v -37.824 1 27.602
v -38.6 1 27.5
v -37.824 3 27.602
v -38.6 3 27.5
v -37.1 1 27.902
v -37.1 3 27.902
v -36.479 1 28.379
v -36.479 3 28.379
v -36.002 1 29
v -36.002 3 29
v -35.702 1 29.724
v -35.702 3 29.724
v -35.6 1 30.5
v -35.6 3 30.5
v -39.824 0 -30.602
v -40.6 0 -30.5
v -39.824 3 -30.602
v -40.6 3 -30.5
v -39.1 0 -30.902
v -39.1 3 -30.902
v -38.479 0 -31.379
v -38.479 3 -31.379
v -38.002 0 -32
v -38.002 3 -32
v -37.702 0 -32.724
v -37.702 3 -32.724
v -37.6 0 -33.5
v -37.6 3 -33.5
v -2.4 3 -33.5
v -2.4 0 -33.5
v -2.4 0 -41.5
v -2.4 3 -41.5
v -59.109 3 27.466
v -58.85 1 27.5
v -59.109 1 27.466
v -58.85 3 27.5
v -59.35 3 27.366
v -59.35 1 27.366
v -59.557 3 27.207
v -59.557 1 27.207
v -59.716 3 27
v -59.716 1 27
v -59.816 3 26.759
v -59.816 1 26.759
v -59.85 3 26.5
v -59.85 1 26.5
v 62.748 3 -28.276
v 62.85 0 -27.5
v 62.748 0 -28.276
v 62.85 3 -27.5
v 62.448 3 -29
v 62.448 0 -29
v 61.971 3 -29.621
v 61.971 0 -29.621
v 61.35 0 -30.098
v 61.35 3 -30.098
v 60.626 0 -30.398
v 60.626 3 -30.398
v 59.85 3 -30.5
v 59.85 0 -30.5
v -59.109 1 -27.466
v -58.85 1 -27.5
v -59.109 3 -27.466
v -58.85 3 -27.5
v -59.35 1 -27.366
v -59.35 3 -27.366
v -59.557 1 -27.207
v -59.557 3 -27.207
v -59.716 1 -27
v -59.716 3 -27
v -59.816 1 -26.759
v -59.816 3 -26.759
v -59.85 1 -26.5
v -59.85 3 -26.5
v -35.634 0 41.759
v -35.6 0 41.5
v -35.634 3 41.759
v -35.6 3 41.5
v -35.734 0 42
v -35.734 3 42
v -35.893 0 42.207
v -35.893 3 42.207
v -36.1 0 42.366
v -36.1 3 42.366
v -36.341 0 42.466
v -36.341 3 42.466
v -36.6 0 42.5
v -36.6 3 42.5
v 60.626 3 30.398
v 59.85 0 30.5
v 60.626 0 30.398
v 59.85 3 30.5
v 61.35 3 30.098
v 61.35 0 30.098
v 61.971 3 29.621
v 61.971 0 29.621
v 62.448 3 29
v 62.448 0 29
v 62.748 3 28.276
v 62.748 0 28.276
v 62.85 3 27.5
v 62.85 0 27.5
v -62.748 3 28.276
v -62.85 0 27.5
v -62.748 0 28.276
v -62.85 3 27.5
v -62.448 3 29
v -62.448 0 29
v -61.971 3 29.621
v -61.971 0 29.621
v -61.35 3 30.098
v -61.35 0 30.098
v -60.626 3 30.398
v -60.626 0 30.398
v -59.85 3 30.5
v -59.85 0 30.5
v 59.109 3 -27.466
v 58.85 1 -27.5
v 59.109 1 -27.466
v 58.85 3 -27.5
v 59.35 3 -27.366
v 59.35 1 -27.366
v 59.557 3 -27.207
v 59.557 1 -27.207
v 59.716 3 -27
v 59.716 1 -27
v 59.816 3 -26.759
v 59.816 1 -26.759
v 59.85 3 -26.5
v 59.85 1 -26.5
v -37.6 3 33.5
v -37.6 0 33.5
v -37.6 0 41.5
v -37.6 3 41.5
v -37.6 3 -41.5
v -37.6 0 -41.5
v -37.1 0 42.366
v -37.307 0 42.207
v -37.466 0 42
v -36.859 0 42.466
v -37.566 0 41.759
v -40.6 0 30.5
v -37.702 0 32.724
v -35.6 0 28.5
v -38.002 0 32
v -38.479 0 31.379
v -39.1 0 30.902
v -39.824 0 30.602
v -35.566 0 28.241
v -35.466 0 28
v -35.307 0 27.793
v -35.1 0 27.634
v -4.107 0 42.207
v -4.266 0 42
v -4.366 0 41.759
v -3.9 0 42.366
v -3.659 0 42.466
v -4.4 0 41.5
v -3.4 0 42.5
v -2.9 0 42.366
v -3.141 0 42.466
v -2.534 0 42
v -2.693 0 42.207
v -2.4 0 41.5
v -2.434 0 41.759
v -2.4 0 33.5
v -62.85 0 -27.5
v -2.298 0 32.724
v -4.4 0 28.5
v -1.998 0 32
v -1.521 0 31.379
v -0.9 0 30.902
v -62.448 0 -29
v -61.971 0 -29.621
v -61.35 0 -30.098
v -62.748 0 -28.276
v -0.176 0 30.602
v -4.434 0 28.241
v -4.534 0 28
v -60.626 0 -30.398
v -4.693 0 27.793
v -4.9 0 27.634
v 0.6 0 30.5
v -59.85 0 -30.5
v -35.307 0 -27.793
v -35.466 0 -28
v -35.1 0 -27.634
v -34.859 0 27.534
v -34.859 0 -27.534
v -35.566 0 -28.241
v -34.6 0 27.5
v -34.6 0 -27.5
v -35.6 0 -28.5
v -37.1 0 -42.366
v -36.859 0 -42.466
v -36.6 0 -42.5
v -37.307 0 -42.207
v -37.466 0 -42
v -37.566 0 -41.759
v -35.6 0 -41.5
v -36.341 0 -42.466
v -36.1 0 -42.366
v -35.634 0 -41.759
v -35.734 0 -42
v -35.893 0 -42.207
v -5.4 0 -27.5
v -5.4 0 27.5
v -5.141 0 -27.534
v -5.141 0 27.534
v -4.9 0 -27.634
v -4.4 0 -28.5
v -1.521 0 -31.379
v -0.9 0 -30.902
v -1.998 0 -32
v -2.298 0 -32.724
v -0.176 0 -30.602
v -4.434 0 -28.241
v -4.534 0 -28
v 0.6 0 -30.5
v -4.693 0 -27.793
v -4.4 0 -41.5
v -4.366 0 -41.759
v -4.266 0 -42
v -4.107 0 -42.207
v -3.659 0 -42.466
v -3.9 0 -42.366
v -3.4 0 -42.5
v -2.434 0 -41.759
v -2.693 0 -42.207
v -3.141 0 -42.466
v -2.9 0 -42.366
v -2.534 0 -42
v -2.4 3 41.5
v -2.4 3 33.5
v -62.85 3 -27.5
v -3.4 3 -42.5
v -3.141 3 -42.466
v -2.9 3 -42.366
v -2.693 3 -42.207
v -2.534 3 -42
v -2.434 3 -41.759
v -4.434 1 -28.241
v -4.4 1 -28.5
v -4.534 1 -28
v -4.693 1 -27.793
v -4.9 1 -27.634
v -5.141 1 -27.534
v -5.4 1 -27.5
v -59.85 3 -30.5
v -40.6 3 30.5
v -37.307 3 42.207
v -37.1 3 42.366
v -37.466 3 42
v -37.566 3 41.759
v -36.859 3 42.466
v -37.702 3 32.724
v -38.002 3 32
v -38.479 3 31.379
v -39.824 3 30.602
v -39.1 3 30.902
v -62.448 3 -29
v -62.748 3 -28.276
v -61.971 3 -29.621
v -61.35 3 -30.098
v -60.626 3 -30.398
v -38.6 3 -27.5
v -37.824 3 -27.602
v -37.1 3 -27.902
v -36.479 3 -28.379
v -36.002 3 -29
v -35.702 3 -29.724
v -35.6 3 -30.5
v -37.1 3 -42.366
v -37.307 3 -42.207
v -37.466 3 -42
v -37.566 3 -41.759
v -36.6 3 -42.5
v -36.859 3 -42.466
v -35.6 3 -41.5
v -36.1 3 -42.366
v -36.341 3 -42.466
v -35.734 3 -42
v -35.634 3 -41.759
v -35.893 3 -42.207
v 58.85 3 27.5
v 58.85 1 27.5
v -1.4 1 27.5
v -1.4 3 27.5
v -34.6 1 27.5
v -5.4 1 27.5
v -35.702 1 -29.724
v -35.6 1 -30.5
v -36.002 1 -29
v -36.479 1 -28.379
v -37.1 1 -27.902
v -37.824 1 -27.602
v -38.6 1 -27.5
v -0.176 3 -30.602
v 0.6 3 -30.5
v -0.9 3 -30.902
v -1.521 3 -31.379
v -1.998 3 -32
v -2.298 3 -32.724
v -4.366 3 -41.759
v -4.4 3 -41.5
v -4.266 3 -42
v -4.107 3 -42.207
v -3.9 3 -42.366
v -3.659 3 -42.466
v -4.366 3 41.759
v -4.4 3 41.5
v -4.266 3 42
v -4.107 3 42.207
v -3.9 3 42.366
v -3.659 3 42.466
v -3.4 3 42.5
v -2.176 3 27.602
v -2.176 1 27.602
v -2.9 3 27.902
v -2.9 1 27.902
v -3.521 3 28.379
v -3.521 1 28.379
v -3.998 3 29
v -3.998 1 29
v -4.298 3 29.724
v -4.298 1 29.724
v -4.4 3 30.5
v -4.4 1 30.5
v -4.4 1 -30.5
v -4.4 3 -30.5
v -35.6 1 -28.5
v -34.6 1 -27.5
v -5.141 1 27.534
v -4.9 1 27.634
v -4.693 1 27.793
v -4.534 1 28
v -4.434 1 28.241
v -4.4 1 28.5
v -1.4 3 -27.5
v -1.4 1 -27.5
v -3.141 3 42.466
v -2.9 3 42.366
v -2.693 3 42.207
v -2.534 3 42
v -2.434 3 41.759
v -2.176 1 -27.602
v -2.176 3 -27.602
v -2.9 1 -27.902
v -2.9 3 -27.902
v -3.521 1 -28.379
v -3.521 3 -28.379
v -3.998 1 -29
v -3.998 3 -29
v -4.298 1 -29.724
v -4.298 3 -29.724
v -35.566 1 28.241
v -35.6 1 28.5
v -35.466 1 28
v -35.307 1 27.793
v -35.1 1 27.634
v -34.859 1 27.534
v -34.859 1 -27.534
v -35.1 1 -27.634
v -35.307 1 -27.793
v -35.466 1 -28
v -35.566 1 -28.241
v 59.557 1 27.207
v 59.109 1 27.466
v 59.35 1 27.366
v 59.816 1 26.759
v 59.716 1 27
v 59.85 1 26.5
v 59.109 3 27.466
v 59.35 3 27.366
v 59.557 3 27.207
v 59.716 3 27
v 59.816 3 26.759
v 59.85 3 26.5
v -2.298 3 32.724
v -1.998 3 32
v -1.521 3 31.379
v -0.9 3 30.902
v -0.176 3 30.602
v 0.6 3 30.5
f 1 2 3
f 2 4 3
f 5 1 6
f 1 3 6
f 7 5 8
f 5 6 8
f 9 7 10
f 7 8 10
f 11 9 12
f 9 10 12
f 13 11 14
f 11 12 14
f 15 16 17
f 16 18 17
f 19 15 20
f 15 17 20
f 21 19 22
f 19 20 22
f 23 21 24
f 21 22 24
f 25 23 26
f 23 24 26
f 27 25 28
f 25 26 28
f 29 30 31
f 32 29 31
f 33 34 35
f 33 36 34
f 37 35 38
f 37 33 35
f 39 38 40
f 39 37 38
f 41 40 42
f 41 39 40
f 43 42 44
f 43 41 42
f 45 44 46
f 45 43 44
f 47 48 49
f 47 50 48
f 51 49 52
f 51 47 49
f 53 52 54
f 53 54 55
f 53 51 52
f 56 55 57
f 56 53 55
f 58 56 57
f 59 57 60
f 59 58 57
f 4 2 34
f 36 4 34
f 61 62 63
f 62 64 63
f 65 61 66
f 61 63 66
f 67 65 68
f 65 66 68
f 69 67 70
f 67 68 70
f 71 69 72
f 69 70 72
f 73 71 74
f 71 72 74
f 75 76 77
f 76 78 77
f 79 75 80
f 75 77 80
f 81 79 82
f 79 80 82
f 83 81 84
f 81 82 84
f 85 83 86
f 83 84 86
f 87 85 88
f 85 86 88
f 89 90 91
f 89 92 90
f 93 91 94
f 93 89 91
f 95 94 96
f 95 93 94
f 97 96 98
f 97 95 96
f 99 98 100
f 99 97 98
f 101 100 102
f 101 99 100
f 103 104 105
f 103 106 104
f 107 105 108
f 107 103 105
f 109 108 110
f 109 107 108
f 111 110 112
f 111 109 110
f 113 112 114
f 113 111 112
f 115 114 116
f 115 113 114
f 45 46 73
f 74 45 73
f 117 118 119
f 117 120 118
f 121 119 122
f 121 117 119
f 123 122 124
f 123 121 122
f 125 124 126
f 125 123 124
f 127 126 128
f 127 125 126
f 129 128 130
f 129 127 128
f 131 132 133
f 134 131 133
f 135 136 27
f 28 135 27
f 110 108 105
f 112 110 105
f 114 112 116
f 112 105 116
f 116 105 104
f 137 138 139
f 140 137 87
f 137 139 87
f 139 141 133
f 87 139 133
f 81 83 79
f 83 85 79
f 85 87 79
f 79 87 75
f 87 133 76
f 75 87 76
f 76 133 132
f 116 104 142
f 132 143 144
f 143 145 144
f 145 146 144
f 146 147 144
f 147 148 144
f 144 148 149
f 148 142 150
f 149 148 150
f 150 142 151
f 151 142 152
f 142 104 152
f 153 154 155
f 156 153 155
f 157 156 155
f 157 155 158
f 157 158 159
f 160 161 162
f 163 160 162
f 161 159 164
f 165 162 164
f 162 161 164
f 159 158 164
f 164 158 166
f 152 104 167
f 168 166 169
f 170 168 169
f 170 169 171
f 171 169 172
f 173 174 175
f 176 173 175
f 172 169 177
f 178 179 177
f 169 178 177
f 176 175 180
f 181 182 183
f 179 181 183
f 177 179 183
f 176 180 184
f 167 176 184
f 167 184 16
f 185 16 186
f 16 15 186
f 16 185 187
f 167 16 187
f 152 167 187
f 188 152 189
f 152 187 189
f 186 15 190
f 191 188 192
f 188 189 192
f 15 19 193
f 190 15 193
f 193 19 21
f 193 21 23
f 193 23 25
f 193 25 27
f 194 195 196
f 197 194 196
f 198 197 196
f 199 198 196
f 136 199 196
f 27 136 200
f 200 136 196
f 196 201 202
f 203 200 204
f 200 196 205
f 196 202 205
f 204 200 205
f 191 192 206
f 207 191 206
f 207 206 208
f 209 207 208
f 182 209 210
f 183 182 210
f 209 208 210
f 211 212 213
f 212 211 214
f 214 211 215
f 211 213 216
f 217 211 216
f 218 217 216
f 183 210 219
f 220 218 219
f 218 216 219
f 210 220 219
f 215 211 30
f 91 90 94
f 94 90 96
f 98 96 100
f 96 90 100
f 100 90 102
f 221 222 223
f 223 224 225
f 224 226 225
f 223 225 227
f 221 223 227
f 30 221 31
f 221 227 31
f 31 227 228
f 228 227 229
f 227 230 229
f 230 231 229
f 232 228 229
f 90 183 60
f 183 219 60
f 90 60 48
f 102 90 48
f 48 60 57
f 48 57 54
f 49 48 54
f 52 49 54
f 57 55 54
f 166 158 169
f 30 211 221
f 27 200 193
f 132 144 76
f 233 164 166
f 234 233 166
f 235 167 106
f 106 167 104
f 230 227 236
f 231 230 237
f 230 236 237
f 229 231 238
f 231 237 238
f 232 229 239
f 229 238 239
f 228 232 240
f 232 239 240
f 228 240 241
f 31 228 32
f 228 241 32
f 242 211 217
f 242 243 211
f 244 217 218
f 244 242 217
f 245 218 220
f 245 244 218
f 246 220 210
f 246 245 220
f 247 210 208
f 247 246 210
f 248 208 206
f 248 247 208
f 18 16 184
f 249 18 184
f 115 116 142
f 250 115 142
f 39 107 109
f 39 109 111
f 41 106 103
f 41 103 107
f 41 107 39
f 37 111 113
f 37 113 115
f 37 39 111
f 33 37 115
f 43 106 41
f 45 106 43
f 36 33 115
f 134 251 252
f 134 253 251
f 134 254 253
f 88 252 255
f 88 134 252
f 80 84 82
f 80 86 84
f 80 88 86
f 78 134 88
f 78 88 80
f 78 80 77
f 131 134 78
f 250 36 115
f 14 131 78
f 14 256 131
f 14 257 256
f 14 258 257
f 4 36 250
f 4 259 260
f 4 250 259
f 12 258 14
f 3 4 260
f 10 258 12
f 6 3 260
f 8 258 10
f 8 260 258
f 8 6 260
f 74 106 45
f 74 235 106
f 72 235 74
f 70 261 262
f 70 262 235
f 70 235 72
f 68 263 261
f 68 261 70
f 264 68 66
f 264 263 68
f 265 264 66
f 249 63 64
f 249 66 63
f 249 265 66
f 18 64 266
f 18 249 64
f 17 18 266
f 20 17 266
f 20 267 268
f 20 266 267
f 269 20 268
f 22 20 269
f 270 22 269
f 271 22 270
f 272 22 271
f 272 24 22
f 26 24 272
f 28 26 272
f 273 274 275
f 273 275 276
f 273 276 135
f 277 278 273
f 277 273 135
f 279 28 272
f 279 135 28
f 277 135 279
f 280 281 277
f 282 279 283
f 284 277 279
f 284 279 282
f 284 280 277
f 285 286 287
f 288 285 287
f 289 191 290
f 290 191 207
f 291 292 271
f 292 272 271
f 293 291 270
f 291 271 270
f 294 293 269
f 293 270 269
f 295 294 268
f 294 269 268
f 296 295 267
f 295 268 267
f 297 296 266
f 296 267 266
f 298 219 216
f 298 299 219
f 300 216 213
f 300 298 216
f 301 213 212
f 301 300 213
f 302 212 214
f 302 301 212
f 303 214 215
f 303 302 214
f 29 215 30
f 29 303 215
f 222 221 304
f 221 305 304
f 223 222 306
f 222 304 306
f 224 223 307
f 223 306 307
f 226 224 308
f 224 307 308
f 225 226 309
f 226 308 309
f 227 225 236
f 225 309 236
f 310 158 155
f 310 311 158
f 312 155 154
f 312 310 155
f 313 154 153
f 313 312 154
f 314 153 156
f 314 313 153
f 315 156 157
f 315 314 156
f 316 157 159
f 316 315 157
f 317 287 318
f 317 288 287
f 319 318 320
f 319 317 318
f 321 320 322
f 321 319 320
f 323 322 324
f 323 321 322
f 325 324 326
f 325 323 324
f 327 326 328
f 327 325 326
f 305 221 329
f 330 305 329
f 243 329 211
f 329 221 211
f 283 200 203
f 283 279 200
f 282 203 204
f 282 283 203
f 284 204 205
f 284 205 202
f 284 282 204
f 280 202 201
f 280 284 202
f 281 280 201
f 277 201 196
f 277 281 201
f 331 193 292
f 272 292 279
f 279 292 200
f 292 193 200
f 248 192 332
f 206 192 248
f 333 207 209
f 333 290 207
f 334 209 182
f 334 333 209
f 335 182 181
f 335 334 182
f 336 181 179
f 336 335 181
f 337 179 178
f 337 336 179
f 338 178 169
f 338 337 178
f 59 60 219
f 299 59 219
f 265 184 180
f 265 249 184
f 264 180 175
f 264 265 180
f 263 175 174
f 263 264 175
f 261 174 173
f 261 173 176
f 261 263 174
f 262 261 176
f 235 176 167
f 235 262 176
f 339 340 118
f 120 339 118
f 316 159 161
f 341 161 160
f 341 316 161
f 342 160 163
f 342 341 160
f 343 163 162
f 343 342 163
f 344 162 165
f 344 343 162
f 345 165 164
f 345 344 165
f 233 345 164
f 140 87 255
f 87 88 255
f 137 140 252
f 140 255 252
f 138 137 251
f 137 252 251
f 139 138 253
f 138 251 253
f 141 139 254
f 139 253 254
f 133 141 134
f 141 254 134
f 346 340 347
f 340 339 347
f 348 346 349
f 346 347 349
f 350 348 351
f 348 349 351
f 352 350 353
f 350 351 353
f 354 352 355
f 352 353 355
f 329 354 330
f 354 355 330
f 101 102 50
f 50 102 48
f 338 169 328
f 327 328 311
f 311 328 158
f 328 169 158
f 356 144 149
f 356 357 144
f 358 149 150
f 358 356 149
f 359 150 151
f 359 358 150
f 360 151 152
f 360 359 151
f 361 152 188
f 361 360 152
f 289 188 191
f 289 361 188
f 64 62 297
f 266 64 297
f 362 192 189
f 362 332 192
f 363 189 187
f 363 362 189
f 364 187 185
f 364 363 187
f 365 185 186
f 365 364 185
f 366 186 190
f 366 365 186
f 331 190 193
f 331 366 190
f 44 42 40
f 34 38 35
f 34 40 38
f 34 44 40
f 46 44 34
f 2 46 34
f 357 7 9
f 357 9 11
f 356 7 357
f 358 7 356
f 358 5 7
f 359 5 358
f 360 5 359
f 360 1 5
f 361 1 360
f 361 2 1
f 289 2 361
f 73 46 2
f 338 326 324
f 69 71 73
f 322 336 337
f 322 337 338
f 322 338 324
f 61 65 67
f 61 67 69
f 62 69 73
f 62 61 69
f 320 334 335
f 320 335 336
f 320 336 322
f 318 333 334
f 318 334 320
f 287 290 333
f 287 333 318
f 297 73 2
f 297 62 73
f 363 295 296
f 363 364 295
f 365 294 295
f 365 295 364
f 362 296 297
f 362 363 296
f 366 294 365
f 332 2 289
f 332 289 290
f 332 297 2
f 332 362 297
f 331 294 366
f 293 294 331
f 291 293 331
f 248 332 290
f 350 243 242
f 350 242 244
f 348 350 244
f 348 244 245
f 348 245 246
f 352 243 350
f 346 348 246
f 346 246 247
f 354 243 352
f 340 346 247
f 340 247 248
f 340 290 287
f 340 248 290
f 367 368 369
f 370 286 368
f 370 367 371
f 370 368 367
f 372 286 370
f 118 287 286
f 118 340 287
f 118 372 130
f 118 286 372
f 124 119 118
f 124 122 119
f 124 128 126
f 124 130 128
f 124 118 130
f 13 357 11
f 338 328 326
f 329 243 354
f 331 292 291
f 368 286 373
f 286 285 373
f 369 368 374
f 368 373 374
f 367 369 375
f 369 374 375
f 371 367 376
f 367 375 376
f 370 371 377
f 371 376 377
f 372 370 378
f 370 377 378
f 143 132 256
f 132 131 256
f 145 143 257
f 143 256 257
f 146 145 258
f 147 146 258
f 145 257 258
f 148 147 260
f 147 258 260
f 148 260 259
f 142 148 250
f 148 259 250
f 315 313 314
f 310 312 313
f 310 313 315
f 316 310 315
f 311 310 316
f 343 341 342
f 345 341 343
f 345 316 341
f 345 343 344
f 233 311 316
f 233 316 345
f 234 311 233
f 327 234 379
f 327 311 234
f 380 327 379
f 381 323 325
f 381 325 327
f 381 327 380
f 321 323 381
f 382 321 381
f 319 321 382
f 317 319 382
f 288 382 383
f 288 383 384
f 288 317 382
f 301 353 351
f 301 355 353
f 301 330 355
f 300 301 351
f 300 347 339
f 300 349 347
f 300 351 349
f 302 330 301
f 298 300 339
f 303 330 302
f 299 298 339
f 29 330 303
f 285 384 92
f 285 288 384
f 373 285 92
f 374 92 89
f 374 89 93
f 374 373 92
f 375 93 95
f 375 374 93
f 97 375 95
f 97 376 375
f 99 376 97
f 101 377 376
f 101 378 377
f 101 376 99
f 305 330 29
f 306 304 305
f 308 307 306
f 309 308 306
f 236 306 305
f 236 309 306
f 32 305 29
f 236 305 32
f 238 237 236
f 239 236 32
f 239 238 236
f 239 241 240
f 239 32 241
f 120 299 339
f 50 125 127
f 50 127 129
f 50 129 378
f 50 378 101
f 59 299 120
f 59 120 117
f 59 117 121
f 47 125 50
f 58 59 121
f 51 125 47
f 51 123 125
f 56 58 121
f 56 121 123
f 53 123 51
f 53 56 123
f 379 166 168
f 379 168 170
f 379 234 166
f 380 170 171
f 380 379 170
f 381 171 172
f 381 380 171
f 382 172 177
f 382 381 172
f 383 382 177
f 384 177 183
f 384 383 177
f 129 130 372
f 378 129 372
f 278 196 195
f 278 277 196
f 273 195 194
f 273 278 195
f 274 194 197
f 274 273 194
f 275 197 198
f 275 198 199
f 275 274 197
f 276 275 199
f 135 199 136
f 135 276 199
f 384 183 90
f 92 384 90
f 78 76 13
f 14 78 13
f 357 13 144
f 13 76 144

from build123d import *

# Parameters (mm, degrees)
BOSS_EXTRUDE6_DEPTH   = 3
BOSS_EXTRUDE6_2_DEPTH = 3
SKETCH4_W             = 119.7
SKETCH4_H             = 55
BOSS_EXTRUDE7_DEPTH   = 1
FILLET13_R            = 3
FILLET14_R            = 1
FILLET15_R            = 1
FILLET16_R            = 3
FILLET17_R            = 3
FILLET18_R            = 1
FILLET19_R            = 3
FILLET20_R            = 1


with BuildPart() as part:
    # Sketch3 → Boss-Extrude6 (new body)
    with BuildSketch(Plane(origin=(0, 0, 0), x_dir=(1, 0, 0), z_dir=(0, 1, 0))):
        Polygon((-35.6, -27.5), (-59.85, -27.5), (-59.85, 27.5), (-35.6, 27.5), (-35.6, 42.5), (-37.6, 42.5), (-37.6, 30.5), (-62.85, 30.5), (-62.85, -30.5), (-37.6, -30.5), (-37.6, -42.5), (-35.6, -42.5), align=None)
    extrude(amount=BOSS_EXTRUDE6_DEPTH)



with BuildPart() as body_2:
    # Sketch3 → Boss-Extrude6 2 (new body)
    with BuildSketch(Plane(origin=(0, 0, 0), x_dir=(1, 0, 0), z_dir=(0, 1, 0))):
        Polygon((59.85, -27.5), (-4.4, -27.5), (-4.4, -42.5), (-2.4, -42.5), (-2.4, -30.5), (62.85, -30.5), (62.85, 30.5), (-2.4, 30.5), (-2.4, 42.5), (-4.4, 42.5), (-4.4, 27.5), (59.85, 27.5), align=None)
    extrude(amount=BOSS_EXTRUDE6_2_DEPTH)


with BuildPart() as part_1:
    add(part.part)

    add(body_2.part)  # Boss-Extrude7 merges body 2
    # Sketch4 → Boss-Extrude7 (add)
    with BuildSketch(Plane(origin=(0, 0, 0), x_dir=(1, 0, 0), z_dir=(0, 1, 0))):
        Rectangle(SKETCH4_W, SKETCH4_H)
    extrude(amount=BOSS_EXTRUDE7_DEPTH)

    # Fillet13
    fillet13_edges = [part_1.edges().sort_by_distance(p)[0] for p in [
        (-62.85, 1.5, 30.5),
        (-62.85, 1.5, -30.5),
        (62.85, 1.5, 30.5),
        (62.85, 1.5, -30.5),
    ]]
    fillet(fillet13_edges, radius=FILLET13_R)

    # Fillet14
    fillet14_edges = [part_1.edges().sort_by_distance(p)[0] for p in [
        (-59.85, 2, -27.5),
        (-59.85, 2, 27.5),
        (59.85, 2, -27.5),
        (59.85, 2, 27.5),
    ]]
    fillet(fillet14_edges, radius=FILLET14_R)

    # Fillet15
    fillet15_edges = [part_1.edges().sort_by_distance(p)[0] for p in [
        (-2.4, 1.5, 42.5),
        (-4.4, 1.5, 42.5),
        (-35.6, 1.5, 42.5),
        (-37.6, 1.5, 42.5),
        (-35.6, 1.5, -42.5),
        (-37.6, 1.5, -42.5),
        (-2.4, 1.5, -42.5),
        (-4.4, 1.5, -42.5),
    ]]
    fillet(fillet15_edges, radius=FILLET15_R - 0.0001)  # a hair under: the kernel refuses the full size

    # Fillet16
    fillet16_edges = [part_1.edges().sort_by_distance(p)[0] for p in [
        (-37.6, 1.5, -30.5),
        (-37.6, 1.5, 30.5),
        (-2.4, 1.5, 30.5),
        (-2.4, 1.5, -30.5),
    ]]
    fillet(fillet16_edges, radius=FILLET16_R)

    # Fillet17
    fillet17_edges = [part_1.edges().sort_by_distance(p)[0] for p in [
        (-35.6, 2, -27.5),
        (-4.4, 2, -27.5),
    ]]
    fillet(fillet17_edges, radius=FILLET17_R)

    # Fillet18
    fillet18_edges = [part_1.edges().sort_by_distance(p)[0] for p in [
        (-35.6, 0.5, -27.5),
        (-4.4, 0.5, -27.5),
    ]]
    fillet(fillet18_edges, radius=FILLET18_R)

    # Fillet19
    fillet19_edges = [part_1.edges().sort_by_distance(p)[0] for p in [
        (-35.6, 2, 27.5),
        (-4.4, 2, 27.5),
    ]]
    fillet(fillet19_edges, radius=FILLET19_R)

    # Fillet20
    fillet20_edges = [part_1.edges().sort_by_distance(p)[0] for p in [
        (-35.6, 0.5, 27.5),
        (-4.4, 0.5, 27.5),
    ]]
    fillet(fillet20_edges, radius=FILLET20_R)


solid = part_1.part
